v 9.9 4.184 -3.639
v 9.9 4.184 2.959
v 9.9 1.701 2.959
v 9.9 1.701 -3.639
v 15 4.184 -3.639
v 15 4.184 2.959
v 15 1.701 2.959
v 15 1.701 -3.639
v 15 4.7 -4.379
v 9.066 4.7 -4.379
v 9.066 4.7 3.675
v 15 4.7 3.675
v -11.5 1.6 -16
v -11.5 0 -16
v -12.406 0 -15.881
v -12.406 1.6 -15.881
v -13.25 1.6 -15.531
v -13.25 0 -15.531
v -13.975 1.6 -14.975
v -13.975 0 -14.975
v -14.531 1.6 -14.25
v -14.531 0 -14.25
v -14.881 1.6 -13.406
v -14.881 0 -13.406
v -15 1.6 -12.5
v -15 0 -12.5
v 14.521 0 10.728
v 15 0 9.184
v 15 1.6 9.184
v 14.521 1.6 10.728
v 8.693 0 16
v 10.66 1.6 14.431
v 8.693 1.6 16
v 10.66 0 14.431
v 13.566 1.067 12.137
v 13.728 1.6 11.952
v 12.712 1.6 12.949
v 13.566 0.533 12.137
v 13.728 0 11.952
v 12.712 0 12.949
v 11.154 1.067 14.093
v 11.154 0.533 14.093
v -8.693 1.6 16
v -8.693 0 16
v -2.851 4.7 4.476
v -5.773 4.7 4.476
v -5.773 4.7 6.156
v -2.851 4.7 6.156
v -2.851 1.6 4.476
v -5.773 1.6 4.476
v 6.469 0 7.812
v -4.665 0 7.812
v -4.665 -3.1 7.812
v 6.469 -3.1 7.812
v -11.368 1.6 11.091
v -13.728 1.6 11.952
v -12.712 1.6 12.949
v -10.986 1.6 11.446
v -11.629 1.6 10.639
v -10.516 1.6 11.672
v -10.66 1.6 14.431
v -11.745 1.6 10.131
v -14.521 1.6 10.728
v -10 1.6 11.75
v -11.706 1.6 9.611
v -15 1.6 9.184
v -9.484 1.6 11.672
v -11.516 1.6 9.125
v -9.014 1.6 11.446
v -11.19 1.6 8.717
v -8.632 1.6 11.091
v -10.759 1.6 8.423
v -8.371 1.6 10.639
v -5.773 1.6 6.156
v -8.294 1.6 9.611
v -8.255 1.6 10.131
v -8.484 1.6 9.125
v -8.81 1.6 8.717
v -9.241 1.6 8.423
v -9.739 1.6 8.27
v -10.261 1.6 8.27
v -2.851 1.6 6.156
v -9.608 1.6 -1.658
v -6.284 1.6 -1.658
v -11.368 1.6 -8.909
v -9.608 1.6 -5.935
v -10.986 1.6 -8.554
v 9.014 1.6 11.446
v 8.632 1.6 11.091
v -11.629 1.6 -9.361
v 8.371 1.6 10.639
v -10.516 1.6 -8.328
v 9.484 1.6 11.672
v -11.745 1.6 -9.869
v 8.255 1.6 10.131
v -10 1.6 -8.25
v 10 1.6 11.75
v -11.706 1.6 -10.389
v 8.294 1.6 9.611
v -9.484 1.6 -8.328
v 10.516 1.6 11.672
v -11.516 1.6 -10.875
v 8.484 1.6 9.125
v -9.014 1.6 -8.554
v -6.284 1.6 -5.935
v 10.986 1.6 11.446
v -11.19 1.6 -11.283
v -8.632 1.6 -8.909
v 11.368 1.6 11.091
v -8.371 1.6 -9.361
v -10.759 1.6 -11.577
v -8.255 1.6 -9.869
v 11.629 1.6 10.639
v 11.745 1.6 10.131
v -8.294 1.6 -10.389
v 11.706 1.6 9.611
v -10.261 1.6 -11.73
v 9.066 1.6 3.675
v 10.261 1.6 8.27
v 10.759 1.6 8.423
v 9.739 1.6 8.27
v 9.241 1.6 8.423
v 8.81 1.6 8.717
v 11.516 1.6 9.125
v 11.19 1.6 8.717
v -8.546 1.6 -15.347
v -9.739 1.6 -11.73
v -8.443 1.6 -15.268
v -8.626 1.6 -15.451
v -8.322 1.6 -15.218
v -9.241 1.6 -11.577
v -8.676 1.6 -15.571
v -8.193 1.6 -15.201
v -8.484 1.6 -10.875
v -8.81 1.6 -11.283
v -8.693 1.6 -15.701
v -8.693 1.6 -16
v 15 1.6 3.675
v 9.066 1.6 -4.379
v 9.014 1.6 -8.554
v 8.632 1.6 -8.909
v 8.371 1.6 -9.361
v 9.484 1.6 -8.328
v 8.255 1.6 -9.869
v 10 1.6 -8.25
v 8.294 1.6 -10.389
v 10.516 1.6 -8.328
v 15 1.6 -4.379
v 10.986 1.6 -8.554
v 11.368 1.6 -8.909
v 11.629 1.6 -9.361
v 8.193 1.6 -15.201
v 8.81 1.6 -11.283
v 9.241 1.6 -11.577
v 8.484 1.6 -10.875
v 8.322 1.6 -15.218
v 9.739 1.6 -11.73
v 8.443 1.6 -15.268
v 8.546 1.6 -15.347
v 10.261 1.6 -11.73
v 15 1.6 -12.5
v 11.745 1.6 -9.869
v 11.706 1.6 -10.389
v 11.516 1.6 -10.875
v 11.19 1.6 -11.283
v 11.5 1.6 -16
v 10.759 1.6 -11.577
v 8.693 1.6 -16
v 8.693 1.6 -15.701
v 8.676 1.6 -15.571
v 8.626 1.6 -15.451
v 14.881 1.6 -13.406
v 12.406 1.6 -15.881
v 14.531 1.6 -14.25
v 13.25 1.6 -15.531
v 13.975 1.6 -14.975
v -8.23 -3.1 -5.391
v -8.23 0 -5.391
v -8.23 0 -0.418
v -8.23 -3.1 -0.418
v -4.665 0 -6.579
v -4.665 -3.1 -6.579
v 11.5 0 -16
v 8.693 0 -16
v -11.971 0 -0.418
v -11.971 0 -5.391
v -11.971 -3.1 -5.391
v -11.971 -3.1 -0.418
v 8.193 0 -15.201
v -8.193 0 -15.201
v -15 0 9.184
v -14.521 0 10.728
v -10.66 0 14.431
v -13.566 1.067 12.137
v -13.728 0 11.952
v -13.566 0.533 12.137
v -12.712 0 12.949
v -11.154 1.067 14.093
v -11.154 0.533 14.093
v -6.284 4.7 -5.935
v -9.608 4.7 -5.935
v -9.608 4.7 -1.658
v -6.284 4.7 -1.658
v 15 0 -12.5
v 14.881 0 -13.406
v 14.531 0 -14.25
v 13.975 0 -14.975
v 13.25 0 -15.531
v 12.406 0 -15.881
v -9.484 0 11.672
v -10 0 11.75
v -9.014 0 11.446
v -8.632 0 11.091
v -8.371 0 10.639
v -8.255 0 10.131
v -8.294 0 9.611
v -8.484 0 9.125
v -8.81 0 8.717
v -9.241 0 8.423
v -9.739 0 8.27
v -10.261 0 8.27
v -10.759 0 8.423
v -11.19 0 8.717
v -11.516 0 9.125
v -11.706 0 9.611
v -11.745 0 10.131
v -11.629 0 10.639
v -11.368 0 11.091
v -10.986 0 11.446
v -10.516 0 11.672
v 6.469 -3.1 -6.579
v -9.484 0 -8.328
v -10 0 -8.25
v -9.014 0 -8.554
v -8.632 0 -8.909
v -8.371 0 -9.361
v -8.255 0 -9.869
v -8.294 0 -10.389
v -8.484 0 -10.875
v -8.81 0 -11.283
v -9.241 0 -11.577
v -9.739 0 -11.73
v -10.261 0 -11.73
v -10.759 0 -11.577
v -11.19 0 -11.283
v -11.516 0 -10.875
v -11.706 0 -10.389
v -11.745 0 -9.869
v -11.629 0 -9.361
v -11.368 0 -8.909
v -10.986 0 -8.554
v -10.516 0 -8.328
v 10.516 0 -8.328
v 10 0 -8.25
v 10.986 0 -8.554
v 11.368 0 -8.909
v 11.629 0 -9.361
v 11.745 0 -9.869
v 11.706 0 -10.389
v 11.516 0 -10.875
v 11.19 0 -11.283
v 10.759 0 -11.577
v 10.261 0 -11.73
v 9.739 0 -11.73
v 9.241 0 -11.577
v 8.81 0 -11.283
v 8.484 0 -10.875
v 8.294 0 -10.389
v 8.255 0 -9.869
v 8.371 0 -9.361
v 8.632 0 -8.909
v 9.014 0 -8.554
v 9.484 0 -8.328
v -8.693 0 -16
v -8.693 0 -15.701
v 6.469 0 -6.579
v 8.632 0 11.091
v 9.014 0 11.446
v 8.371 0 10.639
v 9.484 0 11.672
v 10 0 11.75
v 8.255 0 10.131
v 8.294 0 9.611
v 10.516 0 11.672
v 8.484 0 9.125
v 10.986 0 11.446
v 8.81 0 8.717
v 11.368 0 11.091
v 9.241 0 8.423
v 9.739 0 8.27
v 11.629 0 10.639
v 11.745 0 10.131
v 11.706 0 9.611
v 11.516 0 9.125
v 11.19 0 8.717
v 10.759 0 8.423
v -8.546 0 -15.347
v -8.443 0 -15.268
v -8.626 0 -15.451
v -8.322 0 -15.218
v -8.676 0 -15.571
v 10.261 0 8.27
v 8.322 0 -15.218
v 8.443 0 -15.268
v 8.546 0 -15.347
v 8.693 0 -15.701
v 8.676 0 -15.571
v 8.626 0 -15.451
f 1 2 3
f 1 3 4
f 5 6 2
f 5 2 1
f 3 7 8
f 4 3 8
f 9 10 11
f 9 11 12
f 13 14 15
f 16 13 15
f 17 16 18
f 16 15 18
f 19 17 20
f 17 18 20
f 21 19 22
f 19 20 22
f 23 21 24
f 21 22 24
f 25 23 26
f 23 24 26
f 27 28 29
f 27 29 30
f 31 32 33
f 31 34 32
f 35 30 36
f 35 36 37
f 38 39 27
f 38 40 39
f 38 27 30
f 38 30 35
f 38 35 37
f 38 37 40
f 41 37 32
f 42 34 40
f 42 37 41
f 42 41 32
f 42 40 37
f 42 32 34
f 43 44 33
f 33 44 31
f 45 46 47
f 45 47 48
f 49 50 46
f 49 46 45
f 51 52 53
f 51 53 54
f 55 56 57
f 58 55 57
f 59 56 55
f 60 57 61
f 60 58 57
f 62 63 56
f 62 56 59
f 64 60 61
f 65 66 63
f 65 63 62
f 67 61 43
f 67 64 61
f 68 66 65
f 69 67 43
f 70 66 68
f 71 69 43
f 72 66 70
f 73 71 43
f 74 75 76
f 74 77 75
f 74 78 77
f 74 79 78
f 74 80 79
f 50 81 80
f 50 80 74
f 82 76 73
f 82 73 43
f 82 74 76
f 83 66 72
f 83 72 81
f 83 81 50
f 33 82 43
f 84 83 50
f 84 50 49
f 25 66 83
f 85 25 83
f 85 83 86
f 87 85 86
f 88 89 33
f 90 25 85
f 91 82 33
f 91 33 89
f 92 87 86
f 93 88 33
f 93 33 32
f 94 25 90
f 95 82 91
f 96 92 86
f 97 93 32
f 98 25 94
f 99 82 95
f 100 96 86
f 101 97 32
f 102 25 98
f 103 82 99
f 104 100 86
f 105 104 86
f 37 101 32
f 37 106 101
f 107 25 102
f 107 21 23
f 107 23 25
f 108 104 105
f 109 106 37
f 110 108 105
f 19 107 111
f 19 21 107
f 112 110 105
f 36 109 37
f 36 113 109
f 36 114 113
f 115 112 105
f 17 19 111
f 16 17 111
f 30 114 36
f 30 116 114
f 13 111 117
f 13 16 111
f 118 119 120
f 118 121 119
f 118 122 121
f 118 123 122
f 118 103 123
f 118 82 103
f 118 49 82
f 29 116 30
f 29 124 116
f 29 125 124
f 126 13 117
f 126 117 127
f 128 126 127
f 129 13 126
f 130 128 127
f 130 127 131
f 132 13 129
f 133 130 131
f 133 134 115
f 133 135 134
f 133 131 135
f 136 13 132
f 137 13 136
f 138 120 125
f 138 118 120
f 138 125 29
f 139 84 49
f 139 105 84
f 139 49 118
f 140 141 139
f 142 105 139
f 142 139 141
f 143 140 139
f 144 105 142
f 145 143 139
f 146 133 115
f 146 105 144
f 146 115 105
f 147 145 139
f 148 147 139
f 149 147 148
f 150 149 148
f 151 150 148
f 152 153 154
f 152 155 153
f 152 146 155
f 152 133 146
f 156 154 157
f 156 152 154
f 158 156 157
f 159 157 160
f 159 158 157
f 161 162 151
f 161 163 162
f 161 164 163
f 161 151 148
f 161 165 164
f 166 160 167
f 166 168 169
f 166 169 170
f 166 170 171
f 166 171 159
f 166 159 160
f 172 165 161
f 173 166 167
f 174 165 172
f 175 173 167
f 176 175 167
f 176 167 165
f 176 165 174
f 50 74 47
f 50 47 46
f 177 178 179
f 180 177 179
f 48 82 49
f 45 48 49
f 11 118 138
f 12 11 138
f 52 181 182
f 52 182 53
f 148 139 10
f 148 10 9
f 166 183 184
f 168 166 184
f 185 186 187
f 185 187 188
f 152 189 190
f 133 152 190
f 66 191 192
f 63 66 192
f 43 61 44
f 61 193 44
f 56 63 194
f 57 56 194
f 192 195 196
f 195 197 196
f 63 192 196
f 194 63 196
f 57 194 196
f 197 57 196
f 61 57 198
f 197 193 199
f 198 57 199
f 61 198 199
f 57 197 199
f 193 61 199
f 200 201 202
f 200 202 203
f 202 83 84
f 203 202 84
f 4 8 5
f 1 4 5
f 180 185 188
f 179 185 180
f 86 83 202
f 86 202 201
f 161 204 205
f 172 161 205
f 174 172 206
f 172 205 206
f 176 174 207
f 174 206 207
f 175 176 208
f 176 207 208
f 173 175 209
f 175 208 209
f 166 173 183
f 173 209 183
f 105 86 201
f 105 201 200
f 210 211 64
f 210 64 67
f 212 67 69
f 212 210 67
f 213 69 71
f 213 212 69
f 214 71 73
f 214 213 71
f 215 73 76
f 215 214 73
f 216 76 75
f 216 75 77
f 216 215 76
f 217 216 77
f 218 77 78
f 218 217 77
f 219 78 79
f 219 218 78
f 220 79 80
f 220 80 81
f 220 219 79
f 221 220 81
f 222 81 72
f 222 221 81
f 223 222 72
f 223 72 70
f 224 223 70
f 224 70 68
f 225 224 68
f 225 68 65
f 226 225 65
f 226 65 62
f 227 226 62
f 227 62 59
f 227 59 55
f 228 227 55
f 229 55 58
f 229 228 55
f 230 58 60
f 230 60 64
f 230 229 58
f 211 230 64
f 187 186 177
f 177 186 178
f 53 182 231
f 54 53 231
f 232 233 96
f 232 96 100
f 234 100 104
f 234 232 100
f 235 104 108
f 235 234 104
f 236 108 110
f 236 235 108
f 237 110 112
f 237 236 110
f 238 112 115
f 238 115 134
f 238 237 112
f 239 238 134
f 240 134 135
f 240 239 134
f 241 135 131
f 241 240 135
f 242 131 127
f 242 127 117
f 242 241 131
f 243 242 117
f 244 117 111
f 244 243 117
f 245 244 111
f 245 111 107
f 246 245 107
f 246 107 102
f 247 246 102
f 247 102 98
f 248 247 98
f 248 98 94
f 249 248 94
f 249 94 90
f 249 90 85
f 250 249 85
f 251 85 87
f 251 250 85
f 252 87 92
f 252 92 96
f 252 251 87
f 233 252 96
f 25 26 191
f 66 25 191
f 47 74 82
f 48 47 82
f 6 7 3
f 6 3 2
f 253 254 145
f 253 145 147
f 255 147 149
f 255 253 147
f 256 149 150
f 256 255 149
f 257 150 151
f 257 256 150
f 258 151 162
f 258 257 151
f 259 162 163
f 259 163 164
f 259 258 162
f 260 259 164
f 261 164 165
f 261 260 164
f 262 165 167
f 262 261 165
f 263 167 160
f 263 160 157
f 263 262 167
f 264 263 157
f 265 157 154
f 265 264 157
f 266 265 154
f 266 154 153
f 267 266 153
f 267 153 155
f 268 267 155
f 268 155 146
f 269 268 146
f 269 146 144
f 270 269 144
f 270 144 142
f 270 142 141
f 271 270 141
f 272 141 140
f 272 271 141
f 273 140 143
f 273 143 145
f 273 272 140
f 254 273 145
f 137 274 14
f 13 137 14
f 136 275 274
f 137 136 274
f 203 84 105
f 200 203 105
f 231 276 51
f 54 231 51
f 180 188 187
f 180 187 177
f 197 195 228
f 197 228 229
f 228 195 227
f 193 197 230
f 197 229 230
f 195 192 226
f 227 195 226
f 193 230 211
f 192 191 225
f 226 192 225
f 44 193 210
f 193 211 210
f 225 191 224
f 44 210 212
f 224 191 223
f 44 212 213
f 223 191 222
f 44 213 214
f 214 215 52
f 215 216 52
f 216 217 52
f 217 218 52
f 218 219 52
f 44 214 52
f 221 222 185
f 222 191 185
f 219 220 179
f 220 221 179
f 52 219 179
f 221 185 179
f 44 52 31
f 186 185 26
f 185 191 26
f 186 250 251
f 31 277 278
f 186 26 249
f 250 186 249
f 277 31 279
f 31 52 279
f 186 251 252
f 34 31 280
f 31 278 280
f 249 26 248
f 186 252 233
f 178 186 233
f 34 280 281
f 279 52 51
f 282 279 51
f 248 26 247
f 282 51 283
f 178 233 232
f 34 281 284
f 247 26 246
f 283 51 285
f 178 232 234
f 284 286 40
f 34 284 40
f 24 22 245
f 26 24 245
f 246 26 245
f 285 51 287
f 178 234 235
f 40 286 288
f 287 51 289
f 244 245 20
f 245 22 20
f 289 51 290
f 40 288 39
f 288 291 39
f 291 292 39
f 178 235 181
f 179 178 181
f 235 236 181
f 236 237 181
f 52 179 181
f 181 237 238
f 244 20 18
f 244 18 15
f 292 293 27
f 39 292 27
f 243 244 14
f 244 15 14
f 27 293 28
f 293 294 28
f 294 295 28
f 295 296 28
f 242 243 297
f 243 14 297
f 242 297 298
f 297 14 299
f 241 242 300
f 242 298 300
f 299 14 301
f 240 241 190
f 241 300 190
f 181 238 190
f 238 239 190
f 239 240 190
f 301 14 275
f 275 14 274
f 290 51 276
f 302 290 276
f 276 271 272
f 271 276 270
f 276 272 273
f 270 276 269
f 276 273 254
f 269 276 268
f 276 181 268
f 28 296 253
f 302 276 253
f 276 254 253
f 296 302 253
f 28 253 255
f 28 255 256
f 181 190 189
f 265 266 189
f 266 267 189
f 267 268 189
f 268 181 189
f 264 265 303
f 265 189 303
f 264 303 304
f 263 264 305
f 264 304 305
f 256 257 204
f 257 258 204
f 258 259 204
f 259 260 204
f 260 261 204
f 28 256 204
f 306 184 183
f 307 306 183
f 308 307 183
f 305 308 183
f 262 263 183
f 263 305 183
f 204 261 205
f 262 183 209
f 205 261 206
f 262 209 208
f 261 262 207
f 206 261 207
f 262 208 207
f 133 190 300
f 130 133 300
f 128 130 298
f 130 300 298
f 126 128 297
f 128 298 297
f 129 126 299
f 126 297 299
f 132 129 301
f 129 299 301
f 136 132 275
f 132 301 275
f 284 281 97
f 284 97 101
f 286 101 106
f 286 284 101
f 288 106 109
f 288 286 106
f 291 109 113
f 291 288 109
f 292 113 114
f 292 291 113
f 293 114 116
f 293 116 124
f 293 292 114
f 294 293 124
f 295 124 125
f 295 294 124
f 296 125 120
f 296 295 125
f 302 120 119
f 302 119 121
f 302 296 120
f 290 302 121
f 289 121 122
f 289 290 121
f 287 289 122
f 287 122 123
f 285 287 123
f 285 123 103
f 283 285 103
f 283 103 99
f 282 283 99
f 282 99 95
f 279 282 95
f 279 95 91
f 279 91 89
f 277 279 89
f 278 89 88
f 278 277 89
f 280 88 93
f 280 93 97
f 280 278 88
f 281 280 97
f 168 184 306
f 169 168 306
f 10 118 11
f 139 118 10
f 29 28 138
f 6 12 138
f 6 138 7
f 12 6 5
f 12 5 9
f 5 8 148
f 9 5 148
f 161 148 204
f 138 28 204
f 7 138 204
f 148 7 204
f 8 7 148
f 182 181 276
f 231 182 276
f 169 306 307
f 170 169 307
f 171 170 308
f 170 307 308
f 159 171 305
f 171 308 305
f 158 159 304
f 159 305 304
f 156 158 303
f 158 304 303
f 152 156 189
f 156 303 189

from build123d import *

# Parameters (mm, degrees)
SKETCH1_R           = 1.75
BOSS_EXTRUDE1_DEPTH = 1.6
SKETCH2_W           = 5.933953942
SKETCH2_H           = 8.053817615
SKETCH2_W_2         = 3.324070188
SKETCH2_H_2         = 4.276777171
SKETCH2_W_3         = 2.922259506
SKETCH2_H_3         = 1.680299216
BOSS_EXTRUDE2_DEPTH = 3.1
SKETCH3_W           = 3.740844247
SKETCH3_H           = 4.973122352
SKETCH3_W_2         = 11.134512877
SKETCH3_H_2         = 14.391247869
BOSS_EXTRUDE3_DEPTH = 3.1
SKETCH4_W           = 6.597488945
SKETCH4_H           = 2.482560273
CUT_EXTRUDE1_DEPTH  = 5.1


with BuildPart() as part:
    # Sketch1 → Boss-Extrude1 (new body)
    with BuildSketch(Plane(origin=(0, 0, 0), x_dir=(1, 0, 0), z_dir=(0, 1, 0))):
        with BuildLine():
            Line((-8.692785485, -16), (8.692785485, -16))
            add(Edge.make_bspline(
                [(15, -9.18383354), (14.366330033, -12.951143486), (10.86731964, -13.80158376), (8.692785485, -16)],
                knots=[0, 0, 0, 0, 0.915310456, 0.915310456, 0.915310456, 0.915310456], degree=3))
            Line((15, -9.18383354), (15, 12.5))
            ThreePointArc((15, 12.5), (13.974873734, 14.974873734), (11.5, 16))
            Line((11.5, 16), (8.692785485, 16))
            Line((8.692785485, 16), (8.692785485, 15.700659593))
            ThreePointArc((8.692785485, 15.700659593), (8.546338876, 15.347106203), (8.192785485, 15.200659593))
            Line((8.192785485, 15.200659593), (-8.192785485, 15.200659593))
            ThreePointArc((-8.192785485, 15.200659593), (-8.546338876, 15.347106203), (-8.692785485, 15.700659593))
            Line((-8.692785485, 15.700659593), (-8.692785485, 16))
            Line((-8.692785485, 16), (-11.5, 16))
            ThreePointArc((-11.5, 16), (-13.974873734, 14.974873734), (-15, 12.5))
            Line((-15, 12.5), (-15, -9.18383354))
            add(Edge.make_bspline(
                [(-15, -9.18383354), (-14.366330033, -12.951143486), (-10.86731964, -13.80158376), (-8.692785485, -16)],
                knots=[0, 0, 0, 0, 0.915310456, 0.915310456, 0.915310456, 0.915310456], degree=3))
        make_face()
        with Locations(Location((-10, 10, 0), (0, 0, 270))):
            Circle(SKETCH1_R, mode=Mode.SUBTRACT)
        with Locations(Location((10, 10, 0), (0, 0, 270))):
            Circle(SKETCH1_R, mode=Mode.SUBTRACT)
        with Locations(Location((10, -10, 0), (0, 0, 270))):
            Circle(SKETCH1_R, mode=Mode.SUBTRACT)
        with Locations(Location((-10, -10, 0), (0, 0, 270))):
            Circle(SKETCH1_R, mode=Mode.SUBTRACT)
    extrude(amount=BOSS_EXTRUDE1_DEPTH)

    # Sketch2 → Boss-Extrude2 (add)
    with BuildSketch(Plane(origin=(0, 1.6, 0), x_dir=(1, 0, 0), z_dir=(0, 1, 0))):
        with Locations((12.033023029, 0.352079458)):
            Rectangle(SKETCH2_W, SKETCH2_H)
        with Locations((-7.946367365, 3.796471816)):
            Rectangle(SKETCH2_W_2, SKETCH2_H_2)
        with Locations((-4.311807104, -5.315838698)):
            Rectangle(SKETCH2_W_3, SKETCH2_H_3)
    extrude(amount=BOSS_EXTRUDE2_DEPTH)

    # Sketch3 → Boss-Extrude3 (add)
    with BuildSketch(Plane.XZ):
        with Locations((-10.100279468, -2.904655533)):
            Rectangle(SKETCH3_W, SKETCH3_H)
        with Locations((0.902203613, 0.616139053)):
            Rectangle(SKETCH3_W_2, SKETCH3_H_2)
    extrude(amount=BOSS_EXTRUDE3_DEPTH)

    # Sketch4 → Cut-Extrude1 (cut)
    with BuildSketch(Plane(origin=(15, 0, 0), x_dir=(0, 0, -1), z_dir=(1, 0, 0))):
        with Locations((0.34007675, 2.942483523)):
            Rectangle(SKETCH4_W, SKETCH4_H)
    extrude(amount=-CUT_EXTRUDE1_DEPTH, mode=Mode.SUBTRACT)


solid = part.part
